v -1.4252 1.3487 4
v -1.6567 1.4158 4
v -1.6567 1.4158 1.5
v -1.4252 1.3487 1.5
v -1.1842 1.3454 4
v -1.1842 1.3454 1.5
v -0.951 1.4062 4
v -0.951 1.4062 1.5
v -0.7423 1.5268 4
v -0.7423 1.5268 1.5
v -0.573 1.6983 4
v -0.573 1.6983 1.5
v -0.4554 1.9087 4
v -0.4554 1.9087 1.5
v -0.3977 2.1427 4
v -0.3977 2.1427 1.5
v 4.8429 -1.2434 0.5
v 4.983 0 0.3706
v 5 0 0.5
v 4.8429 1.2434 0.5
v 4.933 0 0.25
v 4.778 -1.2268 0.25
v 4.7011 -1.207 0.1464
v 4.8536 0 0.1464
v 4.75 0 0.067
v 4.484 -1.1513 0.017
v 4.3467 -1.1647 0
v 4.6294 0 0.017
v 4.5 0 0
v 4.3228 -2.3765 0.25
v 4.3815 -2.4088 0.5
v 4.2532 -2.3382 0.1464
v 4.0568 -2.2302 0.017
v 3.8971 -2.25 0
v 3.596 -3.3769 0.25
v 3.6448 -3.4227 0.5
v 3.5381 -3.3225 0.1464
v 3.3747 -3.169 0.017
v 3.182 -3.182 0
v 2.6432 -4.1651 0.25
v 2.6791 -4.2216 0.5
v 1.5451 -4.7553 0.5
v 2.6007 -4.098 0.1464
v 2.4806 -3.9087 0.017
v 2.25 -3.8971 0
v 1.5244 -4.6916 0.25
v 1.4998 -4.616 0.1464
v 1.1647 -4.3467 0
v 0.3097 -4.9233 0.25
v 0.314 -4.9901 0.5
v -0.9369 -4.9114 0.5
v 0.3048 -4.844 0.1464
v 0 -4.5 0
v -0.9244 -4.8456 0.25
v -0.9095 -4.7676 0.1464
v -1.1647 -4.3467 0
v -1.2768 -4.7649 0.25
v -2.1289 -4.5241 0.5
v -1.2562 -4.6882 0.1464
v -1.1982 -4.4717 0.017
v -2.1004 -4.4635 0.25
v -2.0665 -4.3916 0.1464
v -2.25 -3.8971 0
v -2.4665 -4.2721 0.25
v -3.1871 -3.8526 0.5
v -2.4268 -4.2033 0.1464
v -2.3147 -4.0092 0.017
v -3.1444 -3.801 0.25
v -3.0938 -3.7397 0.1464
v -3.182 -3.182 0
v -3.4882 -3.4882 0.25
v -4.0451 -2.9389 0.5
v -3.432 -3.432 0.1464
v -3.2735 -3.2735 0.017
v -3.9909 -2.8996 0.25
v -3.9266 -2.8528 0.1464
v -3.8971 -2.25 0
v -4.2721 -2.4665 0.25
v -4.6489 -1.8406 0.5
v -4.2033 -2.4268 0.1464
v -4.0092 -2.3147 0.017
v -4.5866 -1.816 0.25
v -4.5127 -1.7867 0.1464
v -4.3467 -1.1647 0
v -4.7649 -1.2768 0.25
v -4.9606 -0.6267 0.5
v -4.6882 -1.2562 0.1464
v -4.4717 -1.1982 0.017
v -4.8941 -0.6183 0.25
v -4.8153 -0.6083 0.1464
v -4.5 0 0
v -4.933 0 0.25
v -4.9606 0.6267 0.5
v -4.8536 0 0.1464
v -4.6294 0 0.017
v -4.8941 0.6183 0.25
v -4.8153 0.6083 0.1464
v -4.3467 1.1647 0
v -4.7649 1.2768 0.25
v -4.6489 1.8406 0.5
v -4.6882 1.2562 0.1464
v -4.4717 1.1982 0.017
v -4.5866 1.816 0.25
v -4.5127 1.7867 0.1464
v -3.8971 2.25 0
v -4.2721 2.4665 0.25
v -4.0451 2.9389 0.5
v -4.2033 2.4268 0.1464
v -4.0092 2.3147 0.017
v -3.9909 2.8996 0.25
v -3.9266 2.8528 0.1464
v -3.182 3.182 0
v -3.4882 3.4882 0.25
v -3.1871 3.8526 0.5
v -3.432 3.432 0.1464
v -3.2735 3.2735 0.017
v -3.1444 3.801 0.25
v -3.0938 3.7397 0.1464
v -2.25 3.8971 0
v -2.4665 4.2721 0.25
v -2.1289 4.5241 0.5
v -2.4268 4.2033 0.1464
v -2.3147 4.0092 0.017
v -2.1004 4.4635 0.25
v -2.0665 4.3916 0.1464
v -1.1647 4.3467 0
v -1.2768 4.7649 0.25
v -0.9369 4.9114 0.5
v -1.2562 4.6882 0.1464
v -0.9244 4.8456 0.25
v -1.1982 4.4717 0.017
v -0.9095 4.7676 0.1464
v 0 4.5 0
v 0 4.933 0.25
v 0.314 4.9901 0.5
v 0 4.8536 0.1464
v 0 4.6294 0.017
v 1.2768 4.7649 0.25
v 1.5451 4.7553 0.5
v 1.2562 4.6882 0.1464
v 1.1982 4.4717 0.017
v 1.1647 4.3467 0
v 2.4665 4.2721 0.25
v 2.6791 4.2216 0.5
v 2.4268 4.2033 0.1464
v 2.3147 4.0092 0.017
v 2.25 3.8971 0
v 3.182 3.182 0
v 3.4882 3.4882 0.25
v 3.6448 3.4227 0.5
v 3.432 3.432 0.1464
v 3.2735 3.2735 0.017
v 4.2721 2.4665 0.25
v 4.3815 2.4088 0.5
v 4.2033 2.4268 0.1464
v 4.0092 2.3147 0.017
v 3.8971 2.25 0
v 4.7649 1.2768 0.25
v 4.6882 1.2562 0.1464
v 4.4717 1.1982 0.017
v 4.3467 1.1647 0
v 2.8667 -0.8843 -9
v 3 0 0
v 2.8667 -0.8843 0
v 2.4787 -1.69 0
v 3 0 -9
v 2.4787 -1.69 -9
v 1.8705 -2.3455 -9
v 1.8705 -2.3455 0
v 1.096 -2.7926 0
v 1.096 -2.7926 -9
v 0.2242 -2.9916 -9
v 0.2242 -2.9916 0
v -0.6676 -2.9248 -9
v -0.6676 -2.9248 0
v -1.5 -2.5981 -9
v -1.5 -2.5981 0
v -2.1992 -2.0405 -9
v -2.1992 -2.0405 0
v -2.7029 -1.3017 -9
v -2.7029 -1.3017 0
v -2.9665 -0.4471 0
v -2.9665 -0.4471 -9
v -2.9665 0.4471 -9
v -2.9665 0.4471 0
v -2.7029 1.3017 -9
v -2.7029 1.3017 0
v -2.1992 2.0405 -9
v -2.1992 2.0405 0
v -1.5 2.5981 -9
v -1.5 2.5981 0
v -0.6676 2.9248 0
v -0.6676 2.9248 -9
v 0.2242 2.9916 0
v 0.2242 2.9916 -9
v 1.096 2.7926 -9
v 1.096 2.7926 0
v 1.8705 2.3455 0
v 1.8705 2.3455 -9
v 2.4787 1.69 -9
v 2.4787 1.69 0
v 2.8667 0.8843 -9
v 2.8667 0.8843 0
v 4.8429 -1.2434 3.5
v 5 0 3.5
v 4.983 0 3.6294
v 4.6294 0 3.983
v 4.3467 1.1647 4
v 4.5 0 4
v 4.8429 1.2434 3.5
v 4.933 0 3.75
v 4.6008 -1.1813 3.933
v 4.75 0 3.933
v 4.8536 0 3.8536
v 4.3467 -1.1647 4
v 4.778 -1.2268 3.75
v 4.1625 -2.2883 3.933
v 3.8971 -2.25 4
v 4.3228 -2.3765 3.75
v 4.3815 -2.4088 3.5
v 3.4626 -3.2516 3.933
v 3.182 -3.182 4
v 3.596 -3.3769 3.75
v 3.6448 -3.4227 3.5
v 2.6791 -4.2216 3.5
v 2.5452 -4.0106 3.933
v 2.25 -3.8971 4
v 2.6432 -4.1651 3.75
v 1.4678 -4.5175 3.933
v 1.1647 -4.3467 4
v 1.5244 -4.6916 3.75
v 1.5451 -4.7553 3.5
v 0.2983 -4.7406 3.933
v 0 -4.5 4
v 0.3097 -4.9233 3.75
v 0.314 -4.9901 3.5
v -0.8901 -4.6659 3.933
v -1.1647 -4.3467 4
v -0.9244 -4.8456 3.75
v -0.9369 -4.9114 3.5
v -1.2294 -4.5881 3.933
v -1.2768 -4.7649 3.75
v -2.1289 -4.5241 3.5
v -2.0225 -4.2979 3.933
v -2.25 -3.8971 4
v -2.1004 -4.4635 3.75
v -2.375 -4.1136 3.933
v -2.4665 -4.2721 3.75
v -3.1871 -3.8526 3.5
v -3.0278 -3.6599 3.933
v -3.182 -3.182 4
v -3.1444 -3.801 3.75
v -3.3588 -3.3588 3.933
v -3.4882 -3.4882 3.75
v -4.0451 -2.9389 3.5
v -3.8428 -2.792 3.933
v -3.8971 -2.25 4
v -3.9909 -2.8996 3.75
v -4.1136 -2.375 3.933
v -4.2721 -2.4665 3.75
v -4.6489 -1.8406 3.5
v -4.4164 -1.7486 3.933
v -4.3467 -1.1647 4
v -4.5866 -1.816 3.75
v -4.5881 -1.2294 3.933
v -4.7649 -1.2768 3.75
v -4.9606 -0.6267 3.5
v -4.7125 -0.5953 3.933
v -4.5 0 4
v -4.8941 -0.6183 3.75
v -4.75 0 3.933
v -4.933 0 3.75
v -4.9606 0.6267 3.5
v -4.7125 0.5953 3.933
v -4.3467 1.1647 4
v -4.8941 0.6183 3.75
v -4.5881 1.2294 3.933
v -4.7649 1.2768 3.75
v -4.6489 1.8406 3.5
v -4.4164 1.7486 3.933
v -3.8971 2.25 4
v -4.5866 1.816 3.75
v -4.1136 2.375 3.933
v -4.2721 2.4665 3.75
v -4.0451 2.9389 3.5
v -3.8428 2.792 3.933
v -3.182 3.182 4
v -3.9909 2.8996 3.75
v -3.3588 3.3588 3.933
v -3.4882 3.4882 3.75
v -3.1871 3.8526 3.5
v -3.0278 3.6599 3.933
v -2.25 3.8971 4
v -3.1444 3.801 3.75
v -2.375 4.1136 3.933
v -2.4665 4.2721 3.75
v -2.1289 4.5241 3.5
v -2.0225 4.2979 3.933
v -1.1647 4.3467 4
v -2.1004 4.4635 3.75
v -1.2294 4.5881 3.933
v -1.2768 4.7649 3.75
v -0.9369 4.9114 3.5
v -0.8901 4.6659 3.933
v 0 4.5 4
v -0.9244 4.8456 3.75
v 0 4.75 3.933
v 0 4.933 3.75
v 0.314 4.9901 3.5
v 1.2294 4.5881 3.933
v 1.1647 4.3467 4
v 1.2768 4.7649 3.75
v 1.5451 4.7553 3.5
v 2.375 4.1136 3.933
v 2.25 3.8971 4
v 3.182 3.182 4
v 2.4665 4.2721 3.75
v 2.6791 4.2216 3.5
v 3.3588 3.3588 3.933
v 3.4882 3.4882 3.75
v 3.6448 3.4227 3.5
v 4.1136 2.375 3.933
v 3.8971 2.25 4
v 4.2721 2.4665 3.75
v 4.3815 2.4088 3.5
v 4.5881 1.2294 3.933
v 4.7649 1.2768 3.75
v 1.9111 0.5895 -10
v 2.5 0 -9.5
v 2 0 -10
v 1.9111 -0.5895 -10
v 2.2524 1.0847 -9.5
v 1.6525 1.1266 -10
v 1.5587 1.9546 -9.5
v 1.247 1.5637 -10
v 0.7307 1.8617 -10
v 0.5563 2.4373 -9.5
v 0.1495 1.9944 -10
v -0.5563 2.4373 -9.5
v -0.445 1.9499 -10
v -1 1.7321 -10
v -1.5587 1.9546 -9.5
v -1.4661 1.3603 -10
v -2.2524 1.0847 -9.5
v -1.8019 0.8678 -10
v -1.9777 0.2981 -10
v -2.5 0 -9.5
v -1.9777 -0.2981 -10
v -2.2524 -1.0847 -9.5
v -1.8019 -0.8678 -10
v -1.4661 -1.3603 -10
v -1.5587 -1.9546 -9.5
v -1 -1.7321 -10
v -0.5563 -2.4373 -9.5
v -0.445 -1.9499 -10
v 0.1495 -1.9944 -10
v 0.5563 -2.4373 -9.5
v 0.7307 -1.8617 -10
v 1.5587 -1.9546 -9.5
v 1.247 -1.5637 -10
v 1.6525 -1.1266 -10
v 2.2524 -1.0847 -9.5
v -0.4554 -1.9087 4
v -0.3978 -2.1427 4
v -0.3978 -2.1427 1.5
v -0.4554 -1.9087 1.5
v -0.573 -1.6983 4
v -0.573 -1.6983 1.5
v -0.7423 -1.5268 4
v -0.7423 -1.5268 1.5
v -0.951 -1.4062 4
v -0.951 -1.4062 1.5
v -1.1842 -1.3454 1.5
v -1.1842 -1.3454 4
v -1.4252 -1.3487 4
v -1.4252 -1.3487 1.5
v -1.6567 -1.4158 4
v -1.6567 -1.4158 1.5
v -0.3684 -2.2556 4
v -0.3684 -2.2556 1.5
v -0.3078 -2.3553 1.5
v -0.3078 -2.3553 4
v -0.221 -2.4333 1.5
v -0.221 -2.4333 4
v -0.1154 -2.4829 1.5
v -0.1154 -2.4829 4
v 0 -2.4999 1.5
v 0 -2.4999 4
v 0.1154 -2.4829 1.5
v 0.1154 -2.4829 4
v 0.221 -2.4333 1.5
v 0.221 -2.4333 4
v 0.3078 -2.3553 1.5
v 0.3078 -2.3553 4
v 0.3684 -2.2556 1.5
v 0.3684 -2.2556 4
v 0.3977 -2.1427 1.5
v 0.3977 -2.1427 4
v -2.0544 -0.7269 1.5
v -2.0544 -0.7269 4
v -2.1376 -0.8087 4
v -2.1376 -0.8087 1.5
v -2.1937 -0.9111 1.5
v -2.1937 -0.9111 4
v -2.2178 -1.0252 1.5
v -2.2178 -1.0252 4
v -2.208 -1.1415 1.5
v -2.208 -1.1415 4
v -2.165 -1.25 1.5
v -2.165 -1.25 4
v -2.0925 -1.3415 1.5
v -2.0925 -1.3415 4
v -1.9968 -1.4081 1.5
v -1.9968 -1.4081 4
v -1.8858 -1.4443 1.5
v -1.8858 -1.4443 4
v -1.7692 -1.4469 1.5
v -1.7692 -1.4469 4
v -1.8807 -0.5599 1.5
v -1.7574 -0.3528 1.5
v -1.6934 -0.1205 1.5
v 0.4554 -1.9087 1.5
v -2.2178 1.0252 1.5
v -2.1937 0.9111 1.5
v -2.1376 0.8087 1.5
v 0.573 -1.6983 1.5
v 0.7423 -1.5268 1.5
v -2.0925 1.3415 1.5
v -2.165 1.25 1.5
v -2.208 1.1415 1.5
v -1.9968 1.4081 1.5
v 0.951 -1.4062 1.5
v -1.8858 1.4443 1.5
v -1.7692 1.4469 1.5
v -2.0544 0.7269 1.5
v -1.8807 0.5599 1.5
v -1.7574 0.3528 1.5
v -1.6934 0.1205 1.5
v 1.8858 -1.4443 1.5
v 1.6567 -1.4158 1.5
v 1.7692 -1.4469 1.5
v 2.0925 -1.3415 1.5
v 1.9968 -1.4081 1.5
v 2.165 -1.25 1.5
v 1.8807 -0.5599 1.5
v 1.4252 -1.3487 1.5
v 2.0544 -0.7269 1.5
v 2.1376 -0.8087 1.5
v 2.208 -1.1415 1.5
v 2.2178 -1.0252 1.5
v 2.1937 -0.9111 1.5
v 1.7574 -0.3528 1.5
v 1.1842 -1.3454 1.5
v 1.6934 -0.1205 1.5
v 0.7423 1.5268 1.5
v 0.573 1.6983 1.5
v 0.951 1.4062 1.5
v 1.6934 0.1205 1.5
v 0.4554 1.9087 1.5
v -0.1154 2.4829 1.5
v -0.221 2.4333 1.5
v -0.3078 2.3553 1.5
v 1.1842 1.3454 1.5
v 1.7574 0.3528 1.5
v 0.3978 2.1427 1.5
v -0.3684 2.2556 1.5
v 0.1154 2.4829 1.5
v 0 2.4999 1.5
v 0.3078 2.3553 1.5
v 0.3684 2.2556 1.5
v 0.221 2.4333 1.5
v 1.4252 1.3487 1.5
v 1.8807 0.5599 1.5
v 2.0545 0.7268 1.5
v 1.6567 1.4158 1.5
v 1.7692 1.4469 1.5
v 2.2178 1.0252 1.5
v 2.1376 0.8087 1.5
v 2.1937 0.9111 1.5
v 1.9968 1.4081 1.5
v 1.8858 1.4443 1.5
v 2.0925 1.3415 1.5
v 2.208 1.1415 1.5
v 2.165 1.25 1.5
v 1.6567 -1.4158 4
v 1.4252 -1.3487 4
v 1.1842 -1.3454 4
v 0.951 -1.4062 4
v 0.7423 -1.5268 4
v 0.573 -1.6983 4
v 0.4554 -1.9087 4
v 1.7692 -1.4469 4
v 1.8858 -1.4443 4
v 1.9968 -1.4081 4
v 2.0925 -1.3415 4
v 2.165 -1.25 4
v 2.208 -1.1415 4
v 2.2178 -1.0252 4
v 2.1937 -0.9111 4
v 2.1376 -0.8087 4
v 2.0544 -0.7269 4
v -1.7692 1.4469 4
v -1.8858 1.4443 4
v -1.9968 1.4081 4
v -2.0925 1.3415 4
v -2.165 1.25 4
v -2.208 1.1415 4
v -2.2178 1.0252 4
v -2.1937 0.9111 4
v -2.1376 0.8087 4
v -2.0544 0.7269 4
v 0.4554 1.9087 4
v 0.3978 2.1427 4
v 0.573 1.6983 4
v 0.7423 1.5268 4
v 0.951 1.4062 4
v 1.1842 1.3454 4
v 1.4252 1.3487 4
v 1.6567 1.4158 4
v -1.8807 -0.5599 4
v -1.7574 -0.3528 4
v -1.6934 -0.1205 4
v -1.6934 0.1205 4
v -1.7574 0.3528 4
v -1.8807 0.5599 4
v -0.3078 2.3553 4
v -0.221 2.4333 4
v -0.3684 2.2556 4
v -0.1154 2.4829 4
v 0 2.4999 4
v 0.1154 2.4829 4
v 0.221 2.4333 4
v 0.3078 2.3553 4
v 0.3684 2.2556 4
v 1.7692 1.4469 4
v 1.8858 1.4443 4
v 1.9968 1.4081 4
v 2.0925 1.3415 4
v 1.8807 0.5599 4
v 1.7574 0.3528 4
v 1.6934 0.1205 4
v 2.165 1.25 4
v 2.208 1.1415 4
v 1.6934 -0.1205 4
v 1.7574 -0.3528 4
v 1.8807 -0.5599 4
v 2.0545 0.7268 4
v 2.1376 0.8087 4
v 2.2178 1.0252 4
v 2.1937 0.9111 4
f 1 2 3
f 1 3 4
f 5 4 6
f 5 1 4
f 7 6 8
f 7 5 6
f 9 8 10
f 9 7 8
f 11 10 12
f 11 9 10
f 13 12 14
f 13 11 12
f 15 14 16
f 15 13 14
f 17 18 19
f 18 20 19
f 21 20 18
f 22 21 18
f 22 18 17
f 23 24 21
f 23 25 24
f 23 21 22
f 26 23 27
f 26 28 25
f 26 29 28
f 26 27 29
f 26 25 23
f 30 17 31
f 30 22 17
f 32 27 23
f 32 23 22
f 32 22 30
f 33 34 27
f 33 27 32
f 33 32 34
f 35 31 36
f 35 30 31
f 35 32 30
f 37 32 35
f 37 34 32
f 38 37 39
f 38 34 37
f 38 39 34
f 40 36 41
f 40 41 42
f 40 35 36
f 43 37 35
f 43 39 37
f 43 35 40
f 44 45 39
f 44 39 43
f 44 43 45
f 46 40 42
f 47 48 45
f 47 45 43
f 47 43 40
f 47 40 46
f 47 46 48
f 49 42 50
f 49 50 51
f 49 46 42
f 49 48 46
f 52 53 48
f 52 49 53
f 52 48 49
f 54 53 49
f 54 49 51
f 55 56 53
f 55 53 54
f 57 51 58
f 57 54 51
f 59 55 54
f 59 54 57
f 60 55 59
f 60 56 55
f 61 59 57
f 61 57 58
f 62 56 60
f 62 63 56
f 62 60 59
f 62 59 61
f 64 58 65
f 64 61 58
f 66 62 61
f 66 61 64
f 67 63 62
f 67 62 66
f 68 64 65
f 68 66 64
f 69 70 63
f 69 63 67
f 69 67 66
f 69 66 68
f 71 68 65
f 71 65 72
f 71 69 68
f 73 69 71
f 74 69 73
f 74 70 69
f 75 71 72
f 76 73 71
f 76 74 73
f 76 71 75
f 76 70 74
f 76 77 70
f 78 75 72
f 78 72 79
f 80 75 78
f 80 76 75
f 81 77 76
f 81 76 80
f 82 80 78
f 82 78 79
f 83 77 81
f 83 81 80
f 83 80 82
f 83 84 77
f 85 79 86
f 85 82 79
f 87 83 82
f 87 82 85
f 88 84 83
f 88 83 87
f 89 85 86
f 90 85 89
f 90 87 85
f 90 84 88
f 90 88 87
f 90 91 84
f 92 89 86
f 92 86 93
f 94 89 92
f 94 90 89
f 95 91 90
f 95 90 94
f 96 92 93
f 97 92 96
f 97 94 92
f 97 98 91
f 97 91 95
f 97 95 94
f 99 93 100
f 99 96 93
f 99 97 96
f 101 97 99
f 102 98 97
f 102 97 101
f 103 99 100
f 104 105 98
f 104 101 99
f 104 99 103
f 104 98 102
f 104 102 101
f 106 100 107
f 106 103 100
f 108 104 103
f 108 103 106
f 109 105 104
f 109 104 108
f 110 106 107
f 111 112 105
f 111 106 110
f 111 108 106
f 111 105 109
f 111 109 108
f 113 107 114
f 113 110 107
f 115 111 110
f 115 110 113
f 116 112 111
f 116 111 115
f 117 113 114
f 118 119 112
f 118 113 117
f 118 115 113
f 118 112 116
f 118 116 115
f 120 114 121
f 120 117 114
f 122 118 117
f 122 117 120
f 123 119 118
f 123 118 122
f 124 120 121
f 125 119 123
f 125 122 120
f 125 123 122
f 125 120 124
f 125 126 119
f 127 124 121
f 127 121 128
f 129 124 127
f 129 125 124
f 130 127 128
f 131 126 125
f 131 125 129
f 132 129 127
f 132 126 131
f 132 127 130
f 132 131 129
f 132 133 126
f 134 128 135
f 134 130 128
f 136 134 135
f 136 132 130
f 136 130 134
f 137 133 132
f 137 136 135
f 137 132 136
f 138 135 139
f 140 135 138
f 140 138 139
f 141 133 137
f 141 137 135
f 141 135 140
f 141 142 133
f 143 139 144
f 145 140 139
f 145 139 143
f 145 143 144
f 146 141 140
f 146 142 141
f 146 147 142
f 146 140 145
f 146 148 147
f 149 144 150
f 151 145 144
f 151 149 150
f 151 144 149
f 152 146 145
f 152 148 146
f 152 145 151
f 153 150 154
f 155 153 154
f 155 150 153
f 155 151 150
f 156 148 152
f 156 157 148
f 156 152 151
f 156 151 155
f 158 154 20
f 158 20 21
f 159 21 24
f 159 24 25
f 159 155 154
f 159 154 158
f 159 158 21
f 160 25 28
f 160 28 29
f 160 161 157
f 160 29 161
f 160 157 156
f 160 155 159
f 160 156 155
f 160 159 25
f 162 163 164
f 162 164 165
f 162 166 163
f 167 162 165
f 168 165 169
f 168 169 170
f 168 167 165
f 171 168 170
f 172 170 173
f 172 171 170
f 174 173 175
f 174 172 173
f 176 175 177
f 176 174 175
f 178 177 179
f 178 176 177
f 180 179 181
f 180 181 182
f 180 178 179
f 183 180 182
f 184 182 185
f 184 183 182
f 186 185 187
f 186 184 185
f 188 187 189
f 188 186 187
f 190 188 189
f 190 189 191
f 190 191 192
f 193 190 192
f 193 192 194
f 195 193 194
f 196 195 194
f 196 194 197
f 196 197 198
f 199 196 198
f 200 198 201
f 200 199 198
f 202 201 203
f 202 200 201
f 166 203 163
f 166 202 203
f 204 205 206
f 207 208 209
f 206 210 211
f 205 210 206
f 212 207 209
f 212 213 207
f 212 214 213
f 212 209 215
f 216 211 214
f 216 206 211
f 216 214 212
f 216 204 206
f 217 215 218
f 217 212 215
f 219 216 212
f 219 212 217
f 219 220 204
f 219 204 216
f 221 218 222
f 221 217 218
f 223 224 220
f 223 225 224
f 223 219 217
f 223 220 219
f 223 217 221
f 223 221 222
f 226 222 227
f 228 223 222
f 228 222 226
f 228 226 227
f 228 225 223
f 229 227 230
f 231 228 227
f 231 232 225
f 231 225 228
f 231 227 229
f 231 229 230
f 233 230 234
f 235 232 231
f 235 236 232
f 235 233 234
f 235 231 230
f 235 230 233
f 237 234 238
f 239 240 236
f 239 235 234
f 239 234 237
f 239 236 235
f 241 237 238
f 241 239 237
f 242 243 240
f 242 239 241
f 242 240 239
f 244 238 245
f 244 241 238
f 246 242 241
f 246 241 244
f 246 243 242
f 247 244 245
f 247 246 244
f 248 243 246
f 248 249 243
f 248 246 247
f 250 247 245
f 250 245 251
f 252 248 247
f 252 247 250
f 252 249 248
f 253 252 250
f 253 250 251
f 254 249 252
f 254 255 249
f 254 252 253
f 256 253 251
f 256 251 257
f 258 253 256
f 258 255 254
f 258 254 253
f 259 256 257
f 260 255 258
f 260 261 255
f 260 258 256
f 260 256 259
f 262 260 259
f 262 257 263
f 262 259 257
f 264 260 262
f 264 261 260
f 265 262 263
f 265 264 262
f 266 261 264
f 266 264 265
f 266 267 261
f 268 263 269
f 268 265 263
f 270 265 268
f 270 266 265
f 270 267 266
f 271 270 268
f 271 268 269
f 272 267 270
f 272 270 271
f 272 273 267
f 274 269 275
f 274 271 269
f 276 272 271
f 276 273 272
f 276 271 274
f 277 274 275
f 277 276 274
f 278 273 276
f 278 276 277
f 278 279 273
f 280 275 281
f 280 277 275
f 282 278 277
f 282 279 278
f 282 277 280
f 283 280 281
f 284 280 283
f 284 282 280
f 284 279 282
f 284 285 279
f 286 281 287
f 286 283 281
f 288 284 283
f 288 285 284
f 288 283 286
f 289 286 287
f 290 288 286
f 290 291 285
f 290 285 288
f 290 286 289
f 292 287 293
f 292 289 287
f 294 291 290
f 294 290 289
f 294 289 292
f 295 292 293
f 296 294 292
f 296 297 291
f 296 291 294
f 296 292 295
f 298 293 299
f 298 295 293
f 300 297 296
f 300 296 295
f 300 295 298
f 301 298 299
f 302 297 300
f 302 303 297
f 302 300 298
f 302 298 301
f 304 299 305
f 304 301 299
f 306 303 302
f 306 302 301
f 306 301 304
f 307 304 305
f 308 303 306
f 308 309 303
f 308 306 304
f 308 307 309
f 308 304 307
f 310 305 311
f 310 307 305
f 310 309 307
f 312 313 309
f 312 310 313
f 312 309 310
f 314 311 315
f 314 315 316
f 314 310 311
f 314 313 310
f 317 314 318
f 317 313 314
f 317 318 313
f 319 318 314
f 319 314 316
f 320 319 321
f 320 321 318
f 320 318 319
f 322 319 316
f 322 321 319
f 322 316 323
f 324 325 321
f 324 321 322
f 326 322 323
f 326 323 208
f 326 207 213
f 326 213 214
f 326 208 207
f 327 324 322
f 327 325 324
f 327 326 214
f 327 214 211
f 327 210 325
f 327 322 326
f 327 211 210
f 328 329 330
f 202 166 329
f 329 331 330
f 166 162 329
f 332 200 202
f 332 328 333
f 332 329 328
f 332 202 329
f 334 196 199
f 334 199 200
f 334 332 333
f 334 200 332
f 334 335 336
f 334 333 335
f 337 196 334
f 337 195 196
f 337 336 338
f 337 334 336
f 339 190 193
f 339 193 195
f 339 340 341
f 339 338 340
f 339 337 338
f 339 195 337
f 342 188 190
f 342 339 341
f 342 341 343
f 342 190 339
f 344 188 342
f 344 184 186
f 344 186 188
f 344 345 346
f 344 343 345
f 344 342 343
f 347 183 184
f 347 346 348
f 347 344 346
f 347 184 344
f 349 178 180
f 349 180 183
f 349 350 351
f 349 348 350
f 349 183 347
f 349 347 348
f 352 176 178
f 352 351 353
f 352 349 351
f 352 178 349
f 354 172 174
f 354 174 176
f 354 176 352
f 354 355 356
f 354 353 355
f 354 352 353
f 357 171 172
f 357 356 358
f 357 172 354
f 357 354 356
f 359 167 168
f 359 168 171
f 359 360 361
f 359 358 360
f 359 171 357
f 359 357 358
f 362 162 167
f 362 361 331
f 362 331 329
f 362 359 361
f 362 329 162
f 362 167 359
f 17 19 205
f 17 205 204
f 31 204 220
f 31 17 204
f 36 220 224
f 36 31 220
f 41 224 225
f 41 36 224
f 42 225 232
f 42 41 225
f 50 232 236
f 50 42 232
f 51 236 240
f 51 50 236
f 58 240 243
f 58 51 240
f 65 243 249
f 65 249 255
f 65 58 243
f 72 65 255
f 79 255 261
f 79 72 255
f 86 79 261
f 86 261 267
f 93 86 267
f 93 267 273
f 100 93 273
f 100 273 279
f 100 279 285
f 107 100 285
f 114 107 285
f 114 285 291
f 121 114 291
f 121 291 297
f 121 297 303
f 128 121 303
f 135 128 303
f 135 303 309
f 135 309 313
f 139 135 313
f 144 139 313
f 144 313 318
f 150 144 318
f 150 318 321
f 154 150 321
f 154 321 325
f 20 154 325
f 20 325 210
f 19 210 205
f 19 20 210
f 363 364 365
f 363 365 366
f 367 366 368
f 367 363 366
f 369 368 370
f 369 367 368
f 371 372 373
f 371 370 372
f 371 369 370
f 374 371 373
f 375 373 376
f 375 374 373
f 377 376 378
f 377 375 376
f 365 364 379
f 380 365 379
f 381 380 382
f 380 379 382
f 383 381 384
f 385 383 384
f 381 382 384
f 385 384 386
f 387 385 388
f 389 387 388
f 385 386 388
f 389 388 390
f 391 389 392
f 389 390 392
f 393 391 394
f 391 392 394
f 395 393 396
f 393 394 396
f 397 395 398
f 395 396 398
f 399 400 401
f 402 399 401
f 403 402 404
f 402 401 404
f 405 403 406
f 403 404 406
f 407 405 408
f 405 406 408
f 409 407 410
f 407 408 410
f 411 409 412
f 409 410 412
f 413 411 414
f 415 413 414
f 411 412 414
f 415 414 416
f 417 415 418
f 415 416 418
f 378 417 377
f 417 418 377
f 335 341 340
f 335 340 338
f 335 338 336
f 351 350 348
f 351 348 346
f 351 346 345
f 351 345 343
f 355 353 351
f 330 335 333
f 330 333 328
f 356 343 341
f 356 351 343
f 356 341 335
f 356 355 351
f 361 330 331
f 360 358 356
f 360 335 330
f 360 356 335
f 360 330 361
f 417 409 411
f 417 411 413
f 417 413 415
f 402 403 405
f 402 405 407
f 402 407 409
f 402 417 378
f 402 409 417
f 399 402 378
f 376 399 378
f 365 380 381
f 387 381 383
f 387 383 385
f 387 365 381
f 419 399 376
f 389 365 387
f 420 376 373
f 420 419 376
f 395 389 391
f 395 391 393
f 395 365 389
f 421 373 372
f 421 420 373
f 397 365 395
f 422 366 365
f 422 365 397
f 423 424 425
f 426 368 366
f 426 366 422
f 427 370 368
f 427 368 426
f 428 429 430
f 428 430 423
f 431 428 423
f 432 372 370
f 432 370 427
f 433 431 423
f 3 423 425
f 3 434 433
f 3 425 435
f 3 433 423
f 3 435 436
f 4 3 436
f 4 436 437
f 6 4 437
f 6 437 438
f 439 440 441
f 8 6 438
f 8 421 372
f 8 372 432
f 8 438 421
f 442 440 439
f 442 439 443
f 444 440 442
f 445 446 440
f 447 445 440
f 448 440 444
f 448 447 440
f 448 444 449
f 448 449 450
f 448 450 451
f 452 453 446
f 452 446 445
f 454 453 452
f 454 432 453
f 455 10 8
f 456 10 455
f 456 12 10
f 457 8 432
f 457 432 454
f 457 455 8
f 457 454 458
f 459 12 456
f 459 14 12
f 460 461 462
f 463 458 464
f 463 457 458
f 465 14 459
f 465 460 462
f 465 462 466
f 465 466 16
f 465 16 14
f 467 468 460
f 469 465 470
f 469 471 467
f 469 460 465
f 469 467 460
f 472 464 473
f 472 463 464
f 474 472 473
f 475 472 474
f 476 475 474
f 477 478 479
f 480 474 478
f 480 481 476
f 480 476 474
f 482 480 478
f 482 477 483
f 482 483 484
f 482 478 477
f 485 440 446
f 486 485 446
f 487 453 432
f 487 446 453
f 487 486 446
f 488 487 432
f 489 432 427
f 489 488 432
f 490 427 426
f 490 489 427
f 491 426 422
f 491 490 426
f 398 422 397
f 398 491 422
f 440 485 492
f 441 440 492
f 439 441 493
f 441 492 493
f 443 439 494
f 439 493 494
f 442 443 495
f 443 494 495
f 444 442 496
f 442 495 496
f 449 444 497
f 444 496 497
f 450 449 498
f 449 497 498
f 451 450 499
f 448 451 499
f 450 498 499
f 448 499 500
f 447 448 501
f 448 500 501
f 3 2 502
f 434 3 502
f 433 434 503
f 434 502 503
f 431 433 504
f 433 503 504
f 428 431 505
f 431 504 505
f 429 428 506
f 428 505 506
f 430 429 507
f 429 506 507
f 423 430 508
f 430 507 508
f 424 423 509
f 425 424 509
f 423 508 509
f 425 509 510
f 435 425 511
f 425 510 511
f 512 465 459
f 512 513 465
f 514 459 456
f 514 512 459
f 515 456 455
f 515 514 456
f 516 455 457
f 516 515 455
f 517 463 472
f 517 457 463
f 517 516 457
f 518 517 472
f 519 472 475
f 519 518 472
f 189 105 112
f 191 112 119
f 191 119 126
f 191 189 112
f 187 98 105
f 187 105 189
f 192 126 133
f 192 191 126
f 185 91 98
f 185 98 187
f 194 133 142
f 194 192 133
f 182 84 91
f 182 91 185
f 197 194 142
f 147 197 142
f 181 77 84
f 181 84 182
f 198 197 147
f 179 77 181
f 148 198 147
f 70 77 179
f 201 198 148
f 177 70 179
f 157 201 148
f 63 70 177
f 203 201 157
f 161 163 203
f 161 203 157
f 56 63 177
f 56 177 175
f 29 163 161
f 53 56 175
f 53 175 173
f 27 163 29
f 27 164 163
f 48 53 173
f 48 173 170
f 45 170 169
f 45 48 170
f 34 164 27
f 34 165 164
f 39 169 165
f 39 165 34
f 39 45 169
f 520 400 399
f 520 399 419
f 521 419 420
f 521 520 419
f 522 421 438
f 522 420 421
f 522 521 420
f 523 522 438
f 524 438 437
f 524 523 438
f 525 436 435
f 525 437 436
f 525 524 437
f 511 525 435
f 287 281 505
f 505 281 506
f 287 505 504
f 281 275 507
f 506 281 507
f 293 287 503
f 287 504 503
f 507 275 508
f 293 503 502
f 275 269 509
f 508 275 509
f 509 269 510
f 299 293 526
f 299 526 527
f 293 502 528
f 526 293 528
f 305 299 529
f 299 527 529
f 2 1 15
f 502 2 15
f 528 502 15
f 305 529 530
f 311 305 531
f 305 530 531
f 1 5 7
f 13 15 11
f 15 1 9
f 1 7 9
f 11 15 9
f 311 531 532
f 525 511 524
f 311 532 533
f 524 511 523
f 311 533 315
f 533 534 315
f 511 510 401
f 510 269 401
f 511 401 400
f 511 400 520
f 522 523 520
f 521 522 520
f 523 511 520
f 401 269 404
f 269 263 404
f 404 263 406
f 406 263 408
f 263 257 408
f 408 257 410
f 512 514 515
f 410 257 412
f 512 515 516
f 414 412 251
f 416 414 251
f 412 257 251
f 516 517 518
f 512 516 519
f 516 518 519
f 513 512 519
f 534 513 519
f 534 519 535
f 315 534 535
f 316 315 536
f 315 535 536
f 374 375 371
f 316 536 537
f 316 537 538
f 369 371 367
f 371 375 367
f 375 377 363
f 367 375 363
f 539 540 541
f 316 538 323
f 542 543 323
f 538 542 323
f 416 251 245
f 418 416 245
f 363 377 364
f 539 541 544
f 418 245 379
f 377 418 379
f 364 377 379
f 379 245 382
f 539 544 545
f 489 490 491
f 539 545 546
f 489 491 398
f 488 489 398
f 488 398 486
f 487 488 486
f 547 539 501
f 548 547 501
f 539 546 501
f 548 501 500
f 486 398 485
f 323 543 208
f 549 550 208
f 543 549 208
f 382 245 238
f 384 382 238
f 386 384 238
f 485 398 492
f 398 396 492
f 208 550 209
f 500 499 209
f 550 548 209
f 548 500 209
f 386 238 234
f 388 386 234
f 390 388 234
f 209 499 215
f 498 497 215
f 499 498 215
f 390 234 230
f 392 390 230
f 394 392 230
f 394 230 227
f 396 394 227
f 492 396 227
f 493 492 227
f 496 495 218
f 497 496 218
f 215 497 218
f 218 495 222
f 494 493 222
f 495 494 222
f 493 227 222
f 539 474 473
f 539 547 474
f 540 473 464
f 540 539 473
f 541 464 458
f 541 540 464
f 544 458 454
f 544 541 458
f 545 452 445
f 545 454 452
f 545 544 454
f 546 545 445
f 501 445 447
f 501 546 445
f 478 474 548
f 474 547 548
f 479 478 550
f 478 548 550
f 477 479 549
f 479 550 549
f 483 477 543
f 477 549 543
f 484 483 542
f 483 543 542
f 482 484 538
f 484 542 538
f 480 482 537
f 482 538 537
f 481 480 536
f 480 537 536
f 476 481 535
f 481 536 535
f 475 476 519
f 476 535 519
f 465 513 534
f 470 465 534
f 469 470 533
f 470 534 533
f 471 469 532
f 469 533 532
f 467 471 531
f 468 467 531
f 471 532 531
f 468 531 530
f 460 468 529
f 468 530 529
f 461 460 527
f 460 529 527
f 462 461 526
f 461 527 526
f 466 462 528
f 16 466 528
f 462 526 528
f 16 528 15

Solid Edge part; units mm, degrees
sketch "Sketch1" plane through (0, 0, 0) normal (0, -1, 0) x (1, 0, 0)
  line L0 (0, 4) -> (5, 4)
  line L1 (5, 4) -> (5, 0)
  line L2 (5, 0) -> (3, 0)
  line L3 (3, 0) -> (3, -10)
  line L4 (3, -10) -> (0, -10)
  line L5 (0, -10) -> (0, 4)
  dimension "D1" = 3
  dimension "D2" = 10
  dimension "D3" = 4
  dimension "D4" = 5
revolve "RevolvedProtrusion1" add sketch "Sketch1" angle 360 about axis through (0, 0, 54) along (0, 0, -1)
sketch "Sketch2" plane through (0, 0, 4) normal (0, 0, 1) x (1, 0, 0)
  arc A0 (-2.0545, -0.7268) -> (-1.6567, -1.4158) centre (-1.8186, -1.05) ccw
  arc A1 (-1.6567, -1.4158) -> (-0.3978, -2.1427) centre (-1.2926, -2.2389) cw
  arc A2 (-0.3978, -2.1427) -> (0.3978, -2.1427) centre (0, -2.0999) ccw
  arc A3 (0.3978, -2.1427) -> (1.6567, -1.4158) centre (1.2926, -2.2389) cw
  arc A4 (1.6567, -1.4158) -> (2.0545, -0.7268) centre (1.8186, -1.05) ccw
  arc A5 (2.0545, -0.7268) -> (2.0545, 0.7268) centre (2.5853, 0) cw
  arc A6 (2.0545, 0.7268) -> (1.6567, 1.4158) centre (1.8186, 1.05) ccw
  arc A7 (1.6567, 1.4158) -> (0.3978, 2.1427) centre (1.2926, 2.2389) cw
  arc A8 (0.3978, 2.1427) -> (-0.3978, 2.1427) centre (0, 2.0999) ccw
  arc A9 (-0.3978, 2.1427) -> (-1.6567, 1.4158) centre (-1.2926, 2.2389) cw
  arc A10 (-1.6567, 1.4158) -> (-2.0545, 0.7268) centre (-1.8186, 1.05) ccw
  arc A11 (-2.0545, 0.7268) -> (-2.0545, -0.7268) centre (-2.5853, 0) cw
extrude "Cutout1" cut sketch "Sketch2" against normal blind 2.5
fillet "Verrundung_1" radius 0.5 2 edges at (-5, 0, 4) (-5, 0, 0)
chamfer "Fase_1" distance 1 angle 45 1 edges at (-3, 0, -10)
